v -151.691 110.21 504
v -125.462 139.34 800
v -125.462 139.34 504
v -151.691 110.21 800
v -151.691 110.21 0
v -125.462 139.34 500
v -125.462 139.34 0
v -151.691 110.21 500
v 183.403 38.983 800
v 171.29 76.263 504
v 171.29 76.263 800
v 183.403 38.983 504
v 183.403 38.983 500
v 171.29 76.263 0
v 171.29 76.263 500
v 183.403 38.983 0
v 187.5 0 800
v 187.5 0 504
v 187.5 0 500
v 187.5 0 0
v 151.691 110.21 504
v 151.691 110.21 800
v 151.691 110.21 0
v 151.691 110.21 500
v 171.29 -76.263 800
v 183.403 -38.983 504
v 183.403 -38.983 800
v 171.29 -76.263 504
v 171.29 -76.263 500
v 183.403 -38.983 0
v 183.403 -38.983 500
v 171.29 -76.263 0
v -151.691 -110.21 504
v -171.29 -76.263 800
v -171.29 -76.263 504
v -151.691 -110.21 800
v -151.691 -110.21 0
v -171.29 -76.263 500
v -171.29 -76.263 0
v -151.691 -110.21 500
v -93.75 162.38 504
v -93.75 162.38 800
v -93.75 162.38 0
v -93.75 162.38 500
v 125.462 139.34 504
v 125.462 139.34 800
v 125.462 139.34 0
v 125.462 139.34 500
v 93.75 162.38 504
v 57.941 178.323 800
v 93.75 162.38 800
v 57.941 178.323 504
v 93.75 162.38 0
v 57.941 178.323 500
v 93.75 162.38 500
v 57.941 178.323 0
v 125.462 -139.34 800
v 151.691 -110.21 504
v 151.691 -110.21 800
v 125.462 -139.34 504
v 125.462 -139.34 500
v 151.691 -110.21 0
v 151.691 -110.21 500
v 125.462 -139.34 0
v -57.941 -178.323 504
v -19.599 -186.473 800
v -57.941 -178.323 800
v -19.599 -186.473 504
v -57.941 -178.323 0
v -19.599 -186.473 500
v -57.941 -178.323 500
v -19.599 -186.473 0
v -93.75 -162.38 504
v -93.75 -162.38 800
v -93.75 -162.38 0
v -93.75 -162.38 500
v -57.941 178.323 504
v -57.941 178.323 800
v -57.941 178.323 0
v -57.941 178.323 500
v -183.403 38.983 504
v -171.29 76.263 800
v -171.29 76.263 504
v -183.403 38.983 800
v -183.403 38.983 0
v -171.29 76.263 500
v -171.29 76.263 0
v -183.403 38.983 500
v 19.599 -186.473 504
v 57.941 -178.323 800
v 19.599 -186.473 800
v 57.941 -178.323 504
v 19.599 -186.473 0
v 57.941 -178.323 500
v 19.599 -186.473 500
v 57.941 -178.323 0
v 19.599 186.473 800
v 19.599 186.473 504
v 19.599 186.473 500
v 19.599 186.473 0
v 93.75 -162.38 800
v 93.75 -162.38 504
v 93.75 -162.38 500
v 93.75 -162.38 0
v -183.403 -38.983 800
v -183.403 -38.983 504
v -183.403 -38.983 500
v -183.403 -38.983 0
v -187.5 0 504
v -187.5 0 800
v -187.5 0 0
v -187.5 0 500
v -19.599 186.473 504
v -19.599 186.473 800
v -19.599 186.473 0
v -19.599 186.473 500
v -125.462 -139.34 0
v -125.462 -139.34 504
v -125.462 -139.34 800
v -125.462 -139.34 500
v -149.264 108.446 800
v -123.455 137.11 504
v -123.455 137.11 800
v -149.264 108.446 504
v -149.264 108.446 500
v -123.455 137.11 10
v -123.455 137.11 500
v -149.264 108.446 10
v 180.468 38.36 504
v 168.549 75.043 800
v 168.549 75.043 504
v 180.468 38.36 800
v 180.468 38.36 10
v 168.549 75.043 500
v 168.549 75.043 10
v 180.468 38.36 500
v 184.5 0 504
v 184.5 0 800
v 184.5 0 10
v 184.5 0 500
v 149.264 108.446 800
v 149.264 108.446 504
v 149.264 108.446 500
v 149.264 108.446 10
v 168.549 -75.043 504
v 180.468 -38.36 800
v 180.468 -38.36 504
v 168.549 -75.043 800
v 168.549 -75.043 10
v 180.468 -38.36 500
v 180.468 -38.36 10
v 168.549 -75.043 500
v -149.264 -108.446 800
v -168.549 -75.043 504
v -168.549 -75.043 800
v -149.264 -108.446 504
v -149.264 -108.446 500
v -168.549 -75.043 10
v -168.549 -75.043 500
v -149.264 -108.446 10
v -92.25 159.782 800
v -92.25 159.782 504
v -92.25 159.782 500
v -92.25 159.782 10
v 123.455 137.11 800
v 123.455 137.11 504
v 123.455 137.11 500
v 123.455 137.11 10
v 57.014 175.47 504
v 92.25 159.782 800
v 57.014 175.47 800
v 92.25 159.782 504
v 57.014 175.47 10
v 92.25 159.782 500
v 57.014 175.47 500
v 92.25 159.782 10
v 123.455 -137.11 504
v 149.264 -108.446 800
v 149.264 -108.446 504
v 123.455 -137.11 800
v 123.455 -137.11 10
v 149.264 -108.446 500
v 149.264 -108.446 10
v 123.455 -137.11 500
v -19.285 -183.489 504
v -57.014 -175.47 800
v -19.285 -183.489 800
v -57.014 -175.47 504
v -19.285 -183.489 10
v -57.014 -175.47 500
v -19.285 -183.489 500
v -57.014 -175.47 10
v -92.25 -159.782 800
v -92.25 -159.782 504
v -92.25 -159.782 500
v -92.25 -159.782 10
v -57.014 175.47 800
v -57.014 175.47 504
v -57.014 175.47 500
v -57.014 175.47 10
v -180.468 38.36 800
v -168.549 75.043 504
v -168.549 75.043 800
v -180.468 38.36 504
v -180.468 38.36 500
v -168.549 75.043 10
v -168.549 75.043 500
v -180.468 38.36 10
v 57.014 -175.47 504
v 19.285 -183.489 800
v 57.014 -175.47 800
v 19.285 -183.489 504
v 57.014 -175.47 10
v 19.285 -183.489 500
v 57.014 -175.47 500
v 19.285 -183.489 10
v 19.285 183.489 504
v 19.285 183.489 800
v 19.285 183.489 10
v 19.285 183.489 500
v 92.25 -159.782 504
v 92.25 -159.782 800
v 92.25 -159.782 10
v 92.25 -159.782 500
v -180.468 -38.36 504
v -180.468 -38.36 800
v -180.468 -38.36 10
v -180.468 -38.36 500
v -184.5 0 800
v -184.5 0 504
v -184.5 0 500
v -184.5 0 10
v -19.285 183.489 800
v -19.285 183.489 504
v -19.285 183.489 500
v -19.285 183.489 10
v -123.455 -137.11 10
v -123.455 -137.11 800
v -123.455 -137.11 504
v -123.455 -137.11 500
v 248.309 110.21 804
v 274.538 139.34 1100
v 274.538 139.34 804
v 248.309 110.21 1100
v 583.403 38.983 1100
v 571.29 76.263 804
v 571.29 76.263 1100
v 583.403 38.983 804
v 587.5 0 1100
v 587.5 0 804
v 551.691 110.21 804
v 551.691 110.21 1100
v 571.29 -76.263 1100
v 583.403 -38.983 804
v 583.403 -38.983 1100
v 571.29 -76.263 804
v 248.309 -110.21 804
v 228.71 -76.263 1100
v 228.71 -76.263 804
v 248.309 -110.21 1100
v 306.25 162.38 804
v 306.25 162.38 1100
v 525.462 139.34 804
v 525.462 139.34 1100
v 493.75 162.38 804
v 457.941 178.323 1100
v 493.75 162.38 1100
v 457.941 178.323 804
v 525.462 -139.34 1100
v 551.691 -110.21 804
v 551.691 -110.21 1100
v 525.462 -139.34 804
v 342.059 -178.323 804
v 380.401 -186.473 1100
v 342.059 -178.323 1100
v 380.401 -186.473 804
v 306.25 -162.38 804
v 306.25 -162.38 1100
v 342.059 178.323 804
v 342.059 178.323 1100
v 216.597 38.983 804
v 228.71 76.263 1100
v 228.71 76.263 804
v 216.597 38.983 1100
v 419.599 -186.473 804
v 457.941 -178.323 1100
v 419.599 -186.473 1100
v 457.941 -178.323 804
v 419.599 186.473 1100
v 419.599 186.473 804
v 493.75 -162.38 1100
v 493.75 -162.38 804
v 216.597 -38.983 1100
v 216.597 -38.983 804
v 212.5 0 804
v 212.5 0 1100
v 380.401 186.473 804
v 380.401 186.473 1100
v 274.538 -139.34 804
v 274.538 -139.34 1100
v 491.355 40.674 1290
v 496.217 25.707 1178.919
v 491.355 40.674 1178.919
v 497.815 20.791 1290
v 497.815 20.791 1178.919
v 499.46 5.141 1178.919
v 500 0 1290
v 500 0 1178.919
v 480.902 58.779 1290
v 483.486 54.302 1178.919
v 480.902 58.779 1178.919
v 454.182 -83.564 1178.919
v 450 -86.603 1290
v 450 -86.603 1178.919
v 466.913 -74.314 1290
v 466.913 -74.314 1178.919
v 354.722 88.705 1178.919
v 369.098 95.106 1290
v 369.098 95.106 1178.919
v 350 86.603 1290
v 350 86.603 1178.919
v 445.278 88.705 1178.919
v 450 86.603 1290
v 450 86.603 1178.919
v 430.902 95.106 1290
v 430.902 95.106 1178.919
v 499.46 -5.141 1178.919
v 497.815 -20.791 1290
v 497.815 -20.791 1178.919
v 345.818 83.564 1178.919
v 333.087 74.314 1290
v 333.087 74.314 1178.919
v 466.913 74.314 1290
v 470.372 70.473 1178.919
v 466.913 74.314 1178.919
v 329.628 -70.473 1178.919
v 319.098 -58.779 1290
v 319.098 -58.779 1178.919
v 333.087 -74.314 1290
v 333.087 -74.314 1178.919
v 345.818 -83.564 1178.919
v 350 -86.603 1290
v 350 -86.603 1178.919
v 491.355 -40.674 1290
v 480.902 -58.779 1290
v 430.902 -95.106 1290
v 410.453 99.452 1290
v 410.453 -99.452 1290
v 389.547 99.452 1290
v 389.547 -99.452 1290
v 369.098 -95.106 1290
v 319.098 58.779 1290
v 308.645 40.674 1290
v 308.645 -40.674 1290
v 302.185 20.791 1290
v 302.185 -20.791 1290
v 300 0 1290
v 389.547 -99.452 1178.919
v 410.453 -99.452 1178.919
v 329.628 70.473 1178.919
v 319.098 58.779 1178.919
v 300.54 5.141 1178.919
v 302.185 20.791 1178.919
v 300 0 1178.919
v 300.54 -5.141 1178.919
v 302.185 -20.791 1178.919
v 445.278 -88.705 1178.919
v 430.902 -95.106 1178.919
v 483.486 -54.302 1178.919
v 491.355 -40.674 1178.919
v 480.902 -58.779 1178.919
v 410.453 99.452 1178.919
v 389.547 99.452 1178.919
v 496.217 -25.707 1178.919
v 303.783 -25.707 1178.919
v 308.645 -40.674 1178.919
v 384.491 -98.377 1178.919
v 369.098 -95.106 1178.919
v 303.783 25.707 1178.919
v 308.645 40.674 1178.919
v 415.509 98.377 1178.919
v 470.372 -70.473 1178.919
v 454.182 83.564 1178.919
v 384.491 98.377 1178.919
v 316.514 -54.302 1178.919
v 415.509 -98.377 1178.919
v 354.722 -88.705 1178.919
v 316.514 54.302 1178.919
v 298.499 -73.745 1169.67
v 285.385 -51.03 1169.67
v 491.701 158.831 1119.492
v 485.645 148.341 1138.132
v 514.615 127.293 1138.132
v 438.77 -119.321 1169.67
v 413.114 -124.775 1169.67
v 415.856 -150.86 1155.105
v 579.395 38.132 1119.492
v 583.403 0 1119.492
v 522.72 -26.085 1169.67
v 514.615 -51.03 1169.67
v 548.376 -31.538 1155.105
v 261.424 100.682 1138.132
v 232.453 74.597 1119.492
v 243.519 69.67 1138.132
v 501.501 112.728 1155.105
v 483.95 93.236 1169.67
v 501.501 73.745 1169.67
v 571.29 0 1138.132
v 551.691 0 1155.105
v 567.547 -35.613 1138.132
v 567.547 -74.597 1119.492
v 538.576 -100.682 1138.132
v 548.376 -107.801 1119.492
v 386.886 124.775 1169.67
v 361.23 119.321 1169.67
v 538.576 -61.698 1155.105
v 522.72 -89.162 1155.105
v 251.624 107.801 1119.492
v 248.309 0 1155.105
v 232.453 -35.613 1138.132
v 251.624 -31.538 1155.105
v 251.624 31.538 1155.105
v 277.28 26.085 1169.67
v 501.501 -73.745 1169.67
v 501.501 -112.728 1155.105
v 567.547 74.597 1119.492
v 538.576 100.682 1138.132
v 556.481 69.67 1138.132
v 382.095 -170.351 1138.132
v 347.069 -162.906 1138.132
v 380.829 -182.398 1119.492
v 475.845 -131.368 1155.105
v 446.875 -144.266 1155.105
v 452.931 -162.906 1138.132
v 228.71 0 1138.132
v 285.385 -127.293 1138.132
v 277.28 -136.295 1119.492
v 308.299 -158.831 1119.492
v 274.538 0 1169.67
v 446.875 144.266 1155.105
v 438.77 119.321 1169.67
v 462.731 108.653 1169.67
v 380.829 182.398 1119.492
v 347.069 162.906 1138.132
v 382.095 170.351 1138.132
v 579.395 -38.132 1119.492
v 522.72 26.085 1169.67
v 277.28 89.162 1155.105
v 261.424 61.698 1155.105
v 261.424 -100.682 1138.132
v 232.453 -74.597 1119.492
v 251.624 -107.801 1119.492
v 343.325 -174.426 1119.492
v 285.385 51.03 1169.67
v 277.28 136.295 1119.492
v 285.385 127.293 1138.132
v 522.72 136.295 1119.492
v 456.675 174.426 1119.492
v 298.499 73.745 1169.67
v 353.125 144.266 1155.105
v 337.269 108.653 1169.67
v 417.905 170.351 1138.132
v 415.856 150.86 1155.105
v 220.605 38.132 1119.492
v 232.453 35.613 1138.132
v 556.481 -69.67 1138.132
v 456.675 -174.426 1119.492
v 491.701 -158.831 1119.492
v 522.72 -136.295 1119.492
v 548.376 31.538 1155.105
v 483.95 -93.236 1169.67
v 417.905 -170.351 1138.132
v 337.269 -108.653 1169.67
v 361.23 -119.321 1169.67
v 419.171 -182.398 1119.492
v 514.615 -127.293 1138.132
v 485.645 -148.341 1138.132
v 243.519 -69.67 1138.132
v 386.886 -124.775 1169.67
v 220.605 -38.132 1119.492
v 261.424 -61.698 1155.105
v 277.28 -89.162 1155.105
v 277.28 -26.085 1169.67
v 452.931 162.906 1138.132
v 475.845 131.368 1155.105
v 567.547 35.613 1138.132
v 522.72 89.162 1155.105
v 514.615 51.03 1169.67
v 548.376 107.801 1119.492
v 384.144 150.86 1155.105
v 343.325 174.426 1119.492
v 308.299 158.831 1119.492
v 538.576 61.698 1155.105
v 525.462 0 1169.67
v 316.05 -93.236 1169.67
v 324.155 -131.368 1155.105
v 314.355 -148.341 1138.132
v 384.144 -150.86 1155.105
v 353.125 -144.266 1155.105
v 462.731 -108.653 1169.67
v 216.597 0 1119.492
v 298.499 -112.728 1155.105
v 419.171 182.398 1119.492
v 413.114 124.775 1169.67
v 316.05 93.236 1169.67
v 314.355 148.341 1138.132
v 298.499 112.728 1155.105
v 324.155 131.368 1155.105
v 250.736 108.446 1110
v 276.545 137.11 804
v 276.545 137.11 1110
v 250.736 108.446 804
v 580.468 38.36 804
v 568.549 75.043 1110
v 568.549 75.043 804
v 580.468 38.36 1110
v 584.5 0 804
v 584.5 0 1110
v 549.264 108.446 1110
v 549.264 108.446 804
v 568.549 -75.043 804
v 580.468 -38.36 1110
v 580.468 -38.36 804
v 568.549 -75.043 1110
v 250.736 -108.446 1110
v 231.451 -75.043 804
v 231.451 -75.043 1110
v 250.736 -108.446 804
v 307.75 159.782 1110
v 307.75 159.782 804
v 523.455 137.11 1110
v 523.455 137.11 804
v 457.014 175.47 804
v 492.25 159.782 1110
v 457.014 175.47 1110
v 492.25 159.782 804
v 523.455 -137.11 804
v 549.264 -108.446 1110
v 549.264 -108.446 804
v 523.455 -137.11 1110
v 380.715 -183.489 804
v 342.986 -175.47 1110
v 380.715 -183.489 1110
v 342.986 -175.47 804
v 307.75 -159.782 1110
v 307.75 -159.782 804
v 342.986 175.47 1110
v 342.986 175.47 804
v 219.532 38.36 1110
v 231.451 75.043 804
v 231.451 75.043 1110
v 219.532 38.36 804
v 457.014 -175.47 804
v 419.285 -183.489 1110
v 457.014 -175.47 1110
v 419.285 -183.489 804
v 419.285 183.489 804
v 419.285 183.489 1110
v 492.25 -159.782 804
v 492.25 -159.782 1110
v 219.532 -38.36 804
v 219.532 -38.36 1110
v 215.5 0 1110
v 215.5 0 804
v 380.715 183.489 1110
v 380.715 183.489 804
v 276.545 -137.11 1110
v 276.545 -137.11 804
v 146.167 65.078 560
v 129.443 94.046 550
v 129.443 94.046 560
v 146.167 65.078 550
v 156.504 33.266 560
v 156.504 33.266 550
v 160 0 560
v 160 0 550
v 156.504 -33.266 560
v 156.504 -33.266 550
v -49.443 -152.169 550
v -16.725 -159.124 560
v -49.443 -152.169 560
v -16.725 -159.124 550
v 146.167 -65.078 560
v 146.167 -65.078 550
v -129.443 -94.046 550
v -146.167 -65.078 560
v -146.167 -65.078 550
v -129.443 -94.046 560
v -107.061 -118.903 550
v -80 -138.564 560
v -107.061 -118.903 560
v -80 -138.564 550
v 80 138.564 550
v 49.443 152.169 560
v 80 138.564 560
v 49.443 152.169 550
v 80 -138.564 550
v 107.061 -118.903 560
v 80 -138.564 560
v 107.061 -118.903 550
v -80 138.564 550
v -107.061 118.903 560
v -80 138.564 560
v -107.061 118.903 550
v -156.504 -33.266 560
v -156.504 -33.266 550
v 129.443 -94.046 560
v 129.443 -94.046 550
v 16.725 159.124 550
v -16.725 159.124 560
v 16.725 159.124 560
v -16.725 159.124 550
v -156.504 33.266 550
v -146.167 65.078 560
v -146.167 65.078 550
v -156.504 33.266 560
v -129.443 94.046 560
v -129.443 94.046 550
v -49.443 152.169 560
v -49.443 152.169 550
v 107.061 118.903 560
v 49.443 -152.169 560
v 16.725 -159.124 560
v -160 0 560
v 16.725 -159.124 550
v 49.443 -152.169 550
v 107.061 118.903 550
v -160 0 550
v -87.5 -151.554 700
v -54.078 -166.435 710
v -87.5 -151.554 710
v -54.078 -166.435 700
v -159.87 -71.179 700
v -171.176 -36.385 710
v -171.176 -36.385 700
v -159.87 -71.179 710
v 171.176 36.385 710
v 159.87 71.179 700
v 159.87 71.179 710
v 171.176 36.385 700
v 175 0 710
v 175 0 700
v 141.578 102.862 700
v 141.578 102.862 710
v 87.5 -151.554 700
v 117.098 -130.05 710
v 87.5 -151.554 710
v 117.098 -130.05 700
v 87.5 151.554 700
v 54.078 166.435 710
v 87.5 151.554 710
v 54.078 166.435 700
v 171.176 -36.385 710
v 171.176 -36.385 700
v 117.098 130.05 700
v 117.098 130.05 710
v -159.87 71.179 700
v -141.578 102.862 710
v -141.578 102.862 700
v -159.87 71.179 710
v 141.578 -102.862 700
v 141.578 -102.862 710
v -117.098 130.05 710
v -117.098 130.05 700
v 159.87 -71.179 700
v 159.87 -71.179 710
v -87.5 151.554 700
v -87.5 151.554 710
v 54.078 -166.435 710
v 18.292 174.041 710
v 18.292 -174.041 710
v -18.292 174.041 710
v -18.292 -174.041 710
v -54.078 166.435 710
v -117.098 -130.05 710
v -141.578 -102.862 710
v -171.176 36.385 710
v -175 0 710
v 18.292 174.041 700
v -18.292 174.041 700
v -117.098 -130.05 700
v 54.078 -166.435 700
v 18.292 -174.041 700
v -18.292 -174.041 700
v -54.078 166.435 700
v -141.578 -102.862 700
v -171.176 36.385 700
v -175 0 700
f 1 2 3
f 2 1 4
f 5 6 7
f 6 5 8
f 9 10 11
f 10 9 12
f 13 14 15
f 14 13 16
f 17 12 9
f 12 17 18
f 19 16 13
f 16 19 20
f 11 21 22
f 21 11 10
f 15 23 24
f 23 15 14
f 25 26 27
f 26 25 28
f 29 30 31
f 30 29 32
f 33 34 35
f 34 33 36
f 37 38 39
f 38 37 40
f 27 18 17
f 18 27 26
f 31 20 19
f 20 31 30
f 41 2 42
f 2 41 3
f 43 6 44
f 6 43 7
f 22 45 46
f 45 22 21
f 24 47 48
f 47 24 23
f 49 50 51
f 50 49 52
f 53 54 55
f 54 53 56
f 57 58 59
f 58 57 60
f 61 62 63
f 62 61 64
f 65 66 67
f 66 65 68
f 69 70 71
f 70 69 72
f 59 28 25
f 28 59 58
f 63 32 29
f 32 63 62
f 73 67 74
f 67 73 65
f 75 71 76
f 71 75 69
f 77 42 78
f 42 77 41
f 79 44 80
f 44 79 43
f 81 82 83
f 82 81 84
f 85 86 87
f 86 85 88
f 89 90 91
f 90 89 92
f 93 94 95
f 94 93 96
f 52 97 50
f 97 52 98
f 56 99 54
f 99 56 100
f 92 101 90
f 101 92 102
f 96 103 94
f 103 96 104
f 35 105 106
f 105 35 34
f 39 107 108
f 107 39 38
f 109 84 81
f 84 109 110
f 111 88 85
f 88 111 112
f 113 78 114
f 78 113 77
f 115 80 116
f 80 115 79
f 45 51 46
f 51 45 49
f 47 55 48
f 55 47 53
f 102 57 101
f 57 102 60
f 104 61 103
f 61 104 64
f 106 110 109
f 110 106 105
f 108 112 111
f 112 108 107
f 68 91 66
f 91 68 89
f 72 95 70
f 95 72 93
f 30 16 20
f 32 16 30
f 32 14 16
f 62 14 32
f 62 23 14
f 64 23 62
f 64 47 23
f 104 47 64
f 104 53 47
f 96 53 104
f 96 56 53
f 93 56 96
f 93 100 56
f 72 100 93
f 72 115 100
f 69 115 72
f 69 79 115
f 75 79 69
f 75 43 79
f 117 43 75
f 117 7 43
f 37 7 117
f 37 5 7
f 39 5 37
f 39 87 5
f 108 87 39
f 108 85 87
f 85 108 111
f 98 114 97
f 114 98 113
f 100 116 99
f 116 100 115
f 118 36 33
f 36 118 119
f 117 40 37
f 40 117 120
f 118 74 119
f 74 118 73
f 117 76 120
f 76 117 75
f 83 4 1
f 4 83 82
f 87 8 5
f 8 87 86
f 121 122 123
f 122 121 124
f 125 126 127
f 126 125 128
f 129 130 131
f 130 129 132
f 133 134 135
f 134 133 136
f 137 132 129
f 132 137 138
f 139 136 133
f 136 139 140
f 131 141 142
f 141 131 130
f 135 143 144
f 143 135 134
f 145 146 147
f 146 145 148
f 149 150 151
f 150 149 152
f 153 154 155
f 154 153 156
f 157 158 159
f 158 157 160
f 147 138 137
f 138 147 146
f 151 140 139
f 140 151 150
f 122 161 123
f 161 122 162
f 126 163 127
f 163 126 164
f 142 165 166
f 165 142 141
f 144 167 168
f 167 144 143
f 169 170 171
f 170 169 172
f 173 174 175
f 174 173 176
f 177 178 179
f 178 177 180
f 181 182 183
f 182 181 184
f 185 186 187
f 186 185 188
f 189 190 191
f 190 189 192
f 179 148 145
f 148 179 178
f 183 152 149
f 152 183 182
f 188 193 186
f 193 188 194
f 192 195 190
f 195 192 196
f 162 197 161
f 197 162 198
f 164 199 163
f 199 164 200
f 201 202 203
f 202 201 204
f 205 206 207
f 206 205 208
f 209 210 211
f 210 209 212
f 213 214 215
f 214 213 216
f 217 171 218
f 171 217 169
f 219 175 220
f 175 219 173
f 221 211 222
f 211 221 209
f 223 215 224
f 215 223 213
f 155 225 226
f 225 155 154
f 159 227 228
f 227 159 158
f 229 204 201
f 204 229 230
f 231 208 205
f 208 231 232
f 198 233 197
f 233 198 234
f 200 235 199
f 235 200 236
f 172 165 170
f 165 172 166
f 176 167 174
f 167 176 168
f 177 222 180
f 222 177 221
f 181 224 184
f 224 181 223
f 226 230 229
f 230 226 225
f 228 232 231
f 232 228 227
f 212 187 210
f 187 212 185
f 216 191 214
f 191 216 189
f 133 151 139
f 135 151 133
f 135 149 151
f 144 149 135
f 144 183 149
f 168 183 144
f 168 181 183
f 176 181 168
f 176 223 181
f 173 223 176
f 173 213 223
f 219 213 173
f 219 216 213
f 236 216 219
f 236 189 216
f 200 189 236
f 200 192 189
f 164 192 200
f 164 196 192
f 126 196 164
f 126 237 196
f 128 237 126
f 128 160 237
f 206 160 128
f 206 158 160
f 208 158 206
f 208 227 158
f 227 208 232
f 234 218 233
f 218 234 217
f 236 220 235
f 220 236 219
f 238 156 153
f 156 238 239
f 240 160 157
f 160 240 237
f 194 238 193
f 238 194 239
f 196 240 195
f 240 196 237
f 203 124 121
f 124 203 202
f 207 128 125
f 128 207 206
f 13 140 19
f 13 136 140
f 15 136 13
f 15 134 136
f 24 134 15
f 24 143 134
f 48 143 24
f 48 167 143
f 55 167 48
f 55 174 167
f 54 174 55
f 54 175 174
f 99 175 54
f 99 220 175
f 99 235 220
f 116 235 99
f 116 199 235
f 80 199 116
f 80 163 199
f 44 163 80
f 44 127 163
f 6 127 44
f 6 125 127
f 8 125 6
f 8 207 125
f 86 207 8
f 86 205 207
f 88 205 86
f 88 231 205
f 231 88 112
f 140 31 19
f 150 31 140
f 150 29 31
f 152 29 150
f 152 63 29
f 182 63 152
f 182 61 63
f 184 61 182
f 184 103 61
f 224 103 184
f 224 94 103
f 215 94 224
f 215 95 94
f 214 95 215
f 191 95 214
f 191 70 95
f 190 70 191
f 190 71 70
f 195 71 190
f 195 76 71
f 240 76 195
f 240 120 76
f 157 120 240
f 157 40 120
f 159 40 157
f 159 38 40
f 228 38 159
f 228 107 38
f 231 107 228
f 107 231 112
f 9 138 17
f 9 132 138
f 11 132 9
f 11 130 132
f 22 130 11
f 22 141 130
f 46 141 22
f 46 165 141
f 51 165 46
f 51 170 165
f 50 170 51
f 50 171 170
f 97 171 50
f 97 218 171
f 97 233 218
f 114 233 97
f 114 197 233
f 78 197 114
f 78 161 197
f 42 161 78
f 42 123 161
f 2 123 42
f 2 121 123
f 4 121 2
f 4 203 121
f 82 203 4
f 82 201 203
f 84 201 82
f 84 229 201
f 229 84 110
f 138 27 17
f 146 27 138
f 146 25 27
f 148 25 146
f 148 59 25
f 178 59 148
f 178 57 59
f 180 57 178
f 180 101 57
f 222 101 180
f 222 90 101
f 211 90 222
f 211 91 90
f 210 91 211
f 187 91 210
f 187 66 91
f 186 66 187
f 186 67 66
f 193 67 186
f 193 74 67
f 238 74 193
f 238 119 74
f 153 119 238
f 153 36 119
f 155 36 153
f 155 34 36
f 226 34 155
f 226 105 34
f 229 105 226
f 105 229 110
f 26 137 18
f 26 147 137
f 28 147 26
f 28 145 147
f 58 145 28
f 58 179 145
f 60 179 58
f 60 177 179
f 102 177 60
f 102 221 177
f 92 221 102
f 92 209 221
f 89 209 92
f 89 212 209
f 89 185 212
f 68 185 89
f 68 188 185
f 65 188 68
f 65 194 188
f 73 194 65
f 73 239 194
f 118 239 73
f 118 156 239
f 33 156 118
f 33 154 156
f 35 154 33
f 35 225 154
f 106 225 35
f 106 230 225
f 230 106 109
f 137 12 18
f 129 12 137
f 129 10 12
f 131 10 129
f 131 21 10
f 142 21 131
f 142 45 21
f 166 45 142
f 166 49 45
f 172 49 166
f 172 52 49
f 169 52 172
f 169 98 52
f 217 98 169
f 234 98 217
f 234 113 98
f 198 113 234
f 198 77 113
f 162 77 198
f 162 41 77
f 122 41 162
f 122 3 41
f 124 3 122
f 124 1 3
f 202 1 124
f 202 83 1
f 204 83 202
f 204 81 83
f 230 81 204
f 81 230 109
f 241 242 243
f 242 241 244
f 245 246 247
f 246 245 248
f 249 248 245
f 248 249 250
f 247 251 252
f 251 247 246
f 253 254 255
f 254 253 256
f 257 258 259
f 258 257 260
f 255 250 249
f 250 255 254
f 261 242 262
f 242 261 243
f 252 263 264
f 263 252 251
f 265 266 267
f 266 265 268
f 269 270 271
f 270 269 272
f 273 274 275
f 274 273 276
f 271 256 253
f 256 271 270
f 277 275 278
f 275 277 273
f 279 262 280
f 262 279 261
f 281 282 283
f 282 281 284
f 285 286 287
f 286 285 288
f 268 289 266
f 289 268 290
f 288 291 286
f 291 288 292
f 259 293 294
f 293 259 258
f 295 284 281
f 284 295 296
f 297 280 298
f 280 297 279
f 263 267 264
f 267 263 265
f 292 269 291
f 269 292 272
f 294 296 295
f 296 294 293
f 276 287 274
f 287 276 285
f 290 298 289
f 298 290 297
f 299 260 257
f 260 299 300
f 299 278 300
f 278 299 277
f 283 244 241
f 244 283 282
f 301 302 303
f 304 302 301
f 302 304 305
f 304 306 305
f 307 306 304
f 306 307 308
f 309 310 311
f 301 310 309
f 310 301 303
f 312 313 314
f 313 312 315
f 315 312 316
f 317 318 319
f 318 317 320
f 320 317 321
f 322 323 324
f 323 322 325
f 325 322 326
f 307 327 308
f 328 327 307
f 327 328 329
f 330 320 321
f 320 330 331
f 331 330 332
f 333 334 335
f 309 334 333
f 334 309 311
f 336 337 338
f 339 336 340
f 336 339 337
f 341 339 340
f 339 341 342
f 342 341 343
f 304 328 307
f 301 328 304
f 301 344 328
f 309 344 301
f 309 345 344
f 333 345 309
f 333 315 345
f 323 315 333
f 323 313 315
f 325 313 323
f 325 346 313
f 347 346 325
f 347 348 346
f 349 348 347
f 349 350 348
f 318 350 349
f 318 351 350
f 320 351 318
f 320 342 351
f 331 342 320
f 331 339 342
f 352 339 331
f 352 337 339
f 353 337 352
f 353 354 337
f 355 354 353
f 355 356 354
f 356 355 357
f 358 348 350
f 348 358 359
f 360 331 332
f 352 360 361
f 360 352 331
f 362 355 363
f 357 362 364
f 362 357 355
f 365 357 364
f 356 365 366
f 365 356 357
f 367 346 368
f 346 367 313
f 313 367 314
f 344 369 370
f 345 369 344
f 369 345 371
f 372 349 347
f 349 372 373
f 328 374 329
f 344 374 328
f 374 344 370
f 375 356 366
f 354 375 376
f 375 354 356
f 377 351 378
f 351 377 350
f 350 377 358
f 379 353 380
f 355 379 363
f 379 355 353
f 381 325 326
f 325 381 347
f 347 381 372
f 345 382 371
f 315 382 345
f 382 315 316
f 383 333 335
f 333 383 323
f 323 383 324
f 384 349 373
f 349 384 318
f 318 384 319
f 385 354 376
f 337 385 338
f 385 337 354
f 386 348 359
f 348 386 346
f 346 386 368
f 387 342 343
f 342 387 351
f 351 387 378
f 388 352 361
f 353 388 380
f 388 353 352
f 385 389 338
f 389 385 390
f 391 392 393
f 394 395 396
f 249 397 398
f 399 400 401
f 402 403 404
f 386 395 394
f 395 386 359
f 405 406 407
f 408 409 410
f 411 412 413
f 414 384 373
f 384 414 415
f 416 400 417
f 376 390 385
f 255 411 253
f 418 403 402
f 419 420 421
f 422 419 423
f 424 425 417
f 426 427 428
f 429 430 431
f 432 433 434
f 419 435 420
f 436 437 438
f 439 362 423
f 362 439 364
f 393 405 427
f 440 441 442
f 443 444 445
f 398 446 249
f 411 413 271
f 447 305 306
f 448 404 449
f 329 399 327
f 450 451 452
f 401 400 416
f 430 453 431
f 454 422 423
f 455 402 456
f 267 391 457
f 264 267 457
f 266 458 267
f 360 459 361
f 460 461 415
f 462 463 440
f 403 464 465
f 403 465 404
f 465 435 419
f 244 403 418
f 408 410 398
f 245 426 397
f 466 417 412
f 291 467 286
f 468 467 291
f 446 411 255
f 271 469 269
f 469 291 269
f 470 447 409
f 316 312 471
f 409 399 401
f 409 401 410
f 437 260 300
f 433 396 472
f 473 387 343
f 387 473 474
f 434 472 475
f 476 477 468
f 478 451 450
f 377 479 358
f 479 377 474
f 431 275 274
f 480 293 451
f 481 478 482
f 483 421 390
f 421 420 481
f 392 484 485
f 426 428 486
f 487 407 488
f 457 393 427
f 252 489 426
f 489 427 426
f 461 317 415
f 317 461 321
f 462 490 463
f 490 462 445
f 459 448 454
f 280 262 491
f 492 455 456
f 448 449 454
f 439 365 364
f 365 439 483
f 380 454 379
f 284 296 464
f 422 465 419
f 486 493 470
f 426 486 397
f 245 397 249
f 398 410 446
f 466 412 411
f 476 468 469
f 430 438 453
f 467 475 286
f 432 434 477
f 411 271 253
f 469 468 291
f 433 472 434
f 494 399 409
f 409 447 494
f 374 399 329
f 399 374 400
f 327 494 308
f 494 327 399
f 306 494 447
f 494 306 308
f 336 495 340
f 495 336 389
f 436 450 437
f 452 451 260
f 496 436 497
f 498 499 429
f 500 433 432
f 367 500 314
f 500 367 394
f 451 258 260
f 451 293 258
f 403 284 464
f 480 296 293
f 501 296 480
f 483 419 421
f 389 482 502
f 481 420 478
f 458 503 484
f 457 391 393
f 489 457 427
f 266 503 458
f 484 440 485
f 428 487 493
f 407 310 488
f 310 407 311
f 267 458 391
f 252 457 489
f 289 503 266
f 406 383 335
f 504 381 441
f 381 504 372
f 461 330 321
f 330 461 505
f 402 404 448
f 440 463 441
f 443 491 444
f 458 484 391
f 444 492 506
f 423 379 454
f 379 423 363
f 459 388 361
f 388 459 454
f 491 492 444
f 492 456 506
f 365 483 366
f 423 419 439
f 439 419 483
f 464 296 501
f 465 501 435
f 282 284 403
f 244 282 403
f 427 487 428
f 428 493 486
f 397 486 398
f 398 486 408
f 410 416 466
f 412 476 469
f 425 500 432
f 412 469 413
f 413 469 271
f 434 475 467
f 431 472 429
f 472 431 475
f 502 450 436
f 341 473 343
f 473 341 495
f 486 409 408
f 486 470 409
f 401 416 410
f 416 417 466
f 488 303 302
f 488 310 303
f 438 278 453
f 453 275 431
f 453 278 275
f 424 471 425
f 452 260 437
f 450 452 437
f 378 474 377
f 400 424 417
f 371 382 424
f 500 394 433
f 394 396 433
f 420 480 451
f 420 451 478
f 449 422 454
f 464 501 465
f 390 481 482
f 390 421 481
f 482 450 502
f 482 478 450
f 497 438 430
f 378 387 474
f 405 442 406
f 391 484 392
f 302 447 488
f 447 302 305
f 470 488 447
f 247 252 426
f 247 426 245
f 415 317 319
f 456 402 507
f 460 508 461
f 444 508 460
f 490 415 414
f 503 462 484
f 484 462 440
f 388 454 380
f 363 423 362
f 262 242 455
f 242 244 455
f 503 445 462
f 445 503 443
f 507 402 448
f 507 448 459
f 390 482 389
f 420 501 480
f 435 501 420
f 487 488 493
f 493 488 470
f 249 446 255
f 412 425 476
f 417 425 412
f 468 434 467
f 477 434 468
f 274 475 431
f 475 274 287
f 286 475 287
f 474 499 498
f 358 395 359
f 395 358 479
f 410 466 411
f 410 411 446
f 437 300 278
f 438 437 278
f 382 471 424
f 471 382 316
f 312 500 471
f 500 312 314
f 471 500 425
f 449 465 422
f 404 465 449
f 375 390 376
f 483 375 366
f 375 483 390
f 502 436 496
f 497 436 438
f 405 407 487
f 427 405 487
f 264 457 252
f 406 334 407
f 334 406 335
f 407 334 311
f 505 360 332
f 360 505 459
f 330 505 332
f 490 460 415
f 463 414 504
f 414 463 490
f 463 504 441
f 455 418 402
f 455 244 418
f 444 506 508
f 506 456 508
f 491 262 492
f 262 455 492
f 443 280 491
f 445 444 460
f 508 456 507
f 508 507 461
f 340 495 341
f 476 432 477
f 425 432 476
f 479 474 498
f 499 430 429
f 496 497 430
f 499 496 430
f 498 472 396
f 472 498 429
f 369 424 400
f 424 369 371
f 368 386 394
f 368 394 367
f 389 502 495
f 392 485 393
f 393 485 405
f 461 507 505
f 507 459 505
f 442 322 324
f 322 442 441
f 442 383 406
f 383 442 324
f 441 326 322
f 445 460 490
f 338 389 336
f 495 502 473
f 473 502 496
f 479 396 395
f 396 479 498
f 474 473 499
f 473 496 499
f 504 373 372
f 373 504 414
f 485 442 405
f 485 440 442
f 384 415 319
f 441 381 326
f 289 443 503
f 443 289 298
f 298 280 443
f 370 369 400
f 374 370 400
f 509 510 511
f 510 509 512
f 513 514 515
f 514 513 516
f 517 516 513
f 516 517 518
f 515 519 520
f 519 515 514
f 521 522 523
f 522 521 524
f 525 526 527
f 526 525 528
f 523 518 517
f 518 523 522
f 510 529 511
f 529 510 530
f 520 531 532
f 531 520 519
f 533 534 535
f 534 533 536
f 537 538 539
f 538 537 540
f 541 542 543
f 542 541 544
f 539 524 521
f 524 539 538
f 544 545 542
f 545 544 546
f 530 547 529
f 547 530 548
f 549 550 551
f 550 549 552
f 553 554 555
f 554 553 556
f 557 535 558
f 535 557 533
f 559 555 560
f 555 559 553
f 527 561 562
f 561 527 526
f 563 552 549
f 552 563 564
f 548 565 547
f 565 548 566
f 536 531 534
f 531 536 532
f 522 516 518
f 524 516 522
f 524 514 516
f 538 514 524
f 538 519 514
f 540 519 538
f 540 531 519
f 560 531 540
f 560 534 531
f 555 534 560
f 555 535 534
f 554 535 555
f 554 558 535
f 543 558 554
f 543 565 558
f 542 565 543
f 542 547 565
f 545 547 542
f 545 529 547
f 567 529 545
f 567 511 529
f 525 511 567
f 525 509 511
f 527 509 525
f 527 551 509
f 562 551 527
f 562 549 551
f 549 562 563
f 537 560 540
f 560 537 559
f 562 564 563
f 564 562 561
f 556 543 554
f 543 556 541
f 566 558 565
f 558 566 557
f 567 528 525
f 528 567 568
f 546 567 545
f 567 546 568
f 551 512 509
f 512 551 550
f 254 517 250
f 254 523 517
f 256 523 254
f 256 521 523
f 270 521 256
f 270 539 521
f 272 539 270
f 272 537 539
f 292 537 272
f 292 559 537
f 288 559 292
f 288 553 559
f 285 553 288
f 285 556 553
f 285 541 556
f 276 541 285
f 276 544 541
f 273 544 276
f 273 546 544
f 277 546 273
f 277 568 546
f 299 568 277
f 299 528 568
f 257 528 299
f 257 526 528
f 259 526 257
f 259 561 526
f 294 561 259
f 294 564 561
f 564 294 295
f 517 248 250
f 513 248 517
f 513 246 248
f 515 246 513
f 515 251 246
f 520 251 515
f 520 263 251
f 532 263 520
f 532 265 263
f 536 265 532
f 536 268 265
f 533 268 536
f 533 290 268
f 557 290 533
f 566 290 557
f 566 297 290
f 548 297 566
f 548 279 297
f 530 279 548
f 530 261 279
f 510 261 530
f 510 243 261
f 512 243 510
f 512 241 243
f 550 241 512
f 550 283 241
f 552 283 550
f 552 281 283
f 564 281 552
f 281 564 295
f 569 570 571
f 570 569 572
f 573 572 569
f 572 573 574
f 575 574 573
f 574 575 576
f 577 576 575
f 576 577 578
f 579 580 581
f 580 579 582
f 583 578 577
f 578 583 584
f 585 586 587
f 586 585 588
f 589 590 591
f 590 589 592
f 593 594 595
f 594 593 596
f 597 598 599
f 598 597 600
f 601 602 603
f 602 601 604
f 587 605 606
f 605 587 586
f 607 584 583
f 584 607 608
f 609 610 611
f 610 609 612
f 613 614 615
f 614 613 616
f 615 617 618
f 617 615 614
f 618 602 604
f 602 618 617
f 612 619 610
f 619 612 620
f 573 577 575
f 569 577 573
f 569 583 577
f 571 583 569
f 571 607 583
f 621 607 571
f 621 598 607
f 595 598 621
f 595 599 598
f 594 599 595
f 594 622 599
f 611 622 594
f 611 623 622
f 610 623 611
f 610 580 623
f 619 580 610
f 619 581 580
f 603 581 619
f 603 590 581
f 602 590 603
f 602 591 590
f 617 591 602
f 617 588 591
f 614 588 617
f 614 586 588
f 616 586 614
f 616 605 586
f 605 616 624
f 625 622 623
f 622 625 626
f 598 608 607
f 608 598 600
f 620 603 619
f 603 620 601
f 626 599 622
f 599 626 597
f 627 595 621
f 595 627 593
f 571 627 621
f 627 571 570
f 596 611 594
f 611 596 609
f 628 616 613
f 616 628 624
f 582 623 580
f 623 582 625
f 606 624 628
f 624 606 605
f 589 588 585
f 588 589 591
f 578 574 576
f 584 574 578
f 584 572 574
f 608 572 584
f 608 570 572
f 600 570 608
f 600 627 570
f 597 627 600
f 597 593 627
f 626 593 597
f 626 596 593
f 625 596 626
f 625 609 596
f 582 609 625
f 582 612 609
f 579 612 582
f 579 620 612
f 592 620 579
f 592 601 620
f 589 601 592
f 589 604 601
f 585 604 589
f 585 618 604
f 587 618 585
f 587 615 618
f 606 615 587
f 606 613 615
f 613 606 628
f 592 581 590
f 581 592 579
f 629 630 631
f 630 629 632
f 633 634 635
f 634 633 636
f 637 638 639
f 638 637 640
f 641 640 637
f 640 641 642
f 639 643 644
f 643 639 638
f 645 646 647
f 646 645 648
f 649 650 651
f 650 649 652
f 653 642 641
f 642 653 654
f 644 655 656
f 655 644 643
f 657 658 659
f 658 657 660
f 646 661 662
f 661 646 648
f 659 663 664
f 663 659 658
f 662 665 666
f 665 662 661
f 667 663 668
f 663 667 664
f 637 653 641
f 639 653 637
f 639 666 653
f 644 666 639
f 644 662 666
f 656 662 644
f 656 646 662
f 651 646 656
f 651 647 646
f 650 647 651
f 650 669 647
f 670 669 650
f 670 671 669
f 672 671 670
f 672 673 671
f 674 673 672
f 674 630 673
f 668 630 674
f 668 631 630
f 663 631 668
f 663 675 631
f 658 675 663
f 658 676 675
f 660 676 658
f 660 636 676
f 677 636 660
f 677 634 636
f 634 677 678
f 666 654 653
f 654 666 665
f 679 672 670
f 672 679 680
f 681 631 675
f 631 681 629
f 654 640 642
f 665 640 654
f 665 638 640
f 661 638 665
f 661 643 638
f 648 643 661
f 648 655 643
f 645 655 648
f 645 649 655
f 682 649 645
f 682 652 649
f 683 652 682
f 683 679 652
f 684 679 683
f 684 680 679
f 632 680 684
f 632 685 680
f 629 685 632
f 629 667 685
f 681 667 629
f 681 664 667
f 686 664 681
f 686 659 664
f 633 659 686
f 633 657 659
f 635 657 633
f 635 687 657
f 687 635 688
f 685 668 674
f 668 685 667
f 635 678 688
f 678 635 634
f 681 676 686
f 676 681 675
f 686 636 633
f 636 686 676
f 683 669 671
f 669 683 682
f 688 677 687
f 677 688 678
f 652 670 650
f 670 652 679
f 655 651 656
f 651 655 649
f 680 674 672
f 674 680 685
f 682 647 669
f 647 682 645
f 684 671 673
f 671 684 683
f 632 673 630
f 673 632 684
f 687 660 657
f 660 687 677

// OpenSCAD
intersection() {
    gas();
    cube([400, 400, 500*2], center=true);
}
intersection() {
    gas();
    translate([0, 0, 652])
        cube([400, 400, 300-4], center=true);
}

translate([400, 0, 0])
intersection() {
    gas();
    translate([0, 0, 1104])
        cube([400, 400, 600], center=true);
}

translate([0, 0, 550])
    color([.7, .7, .7, .7])
        cylinder(d=320, h=10);

translate([0, 0, 700])
    color([.7, .7, .7, .3])
        cylinder(d=350, h=10);

module gas() {
    difference() {
        union() {
            cylinder(
                d=375,
                h=1100
            );
            cylinder(
                d=200,
                h=1290
            );
            translate([0, 0, 1100])
                scale([1, 1, .5])
                    sphere(d=375);
        }
        translate([0, 0, 10])
            cylinder(
                d=375-6,
                h=1100
            );
    }
}
